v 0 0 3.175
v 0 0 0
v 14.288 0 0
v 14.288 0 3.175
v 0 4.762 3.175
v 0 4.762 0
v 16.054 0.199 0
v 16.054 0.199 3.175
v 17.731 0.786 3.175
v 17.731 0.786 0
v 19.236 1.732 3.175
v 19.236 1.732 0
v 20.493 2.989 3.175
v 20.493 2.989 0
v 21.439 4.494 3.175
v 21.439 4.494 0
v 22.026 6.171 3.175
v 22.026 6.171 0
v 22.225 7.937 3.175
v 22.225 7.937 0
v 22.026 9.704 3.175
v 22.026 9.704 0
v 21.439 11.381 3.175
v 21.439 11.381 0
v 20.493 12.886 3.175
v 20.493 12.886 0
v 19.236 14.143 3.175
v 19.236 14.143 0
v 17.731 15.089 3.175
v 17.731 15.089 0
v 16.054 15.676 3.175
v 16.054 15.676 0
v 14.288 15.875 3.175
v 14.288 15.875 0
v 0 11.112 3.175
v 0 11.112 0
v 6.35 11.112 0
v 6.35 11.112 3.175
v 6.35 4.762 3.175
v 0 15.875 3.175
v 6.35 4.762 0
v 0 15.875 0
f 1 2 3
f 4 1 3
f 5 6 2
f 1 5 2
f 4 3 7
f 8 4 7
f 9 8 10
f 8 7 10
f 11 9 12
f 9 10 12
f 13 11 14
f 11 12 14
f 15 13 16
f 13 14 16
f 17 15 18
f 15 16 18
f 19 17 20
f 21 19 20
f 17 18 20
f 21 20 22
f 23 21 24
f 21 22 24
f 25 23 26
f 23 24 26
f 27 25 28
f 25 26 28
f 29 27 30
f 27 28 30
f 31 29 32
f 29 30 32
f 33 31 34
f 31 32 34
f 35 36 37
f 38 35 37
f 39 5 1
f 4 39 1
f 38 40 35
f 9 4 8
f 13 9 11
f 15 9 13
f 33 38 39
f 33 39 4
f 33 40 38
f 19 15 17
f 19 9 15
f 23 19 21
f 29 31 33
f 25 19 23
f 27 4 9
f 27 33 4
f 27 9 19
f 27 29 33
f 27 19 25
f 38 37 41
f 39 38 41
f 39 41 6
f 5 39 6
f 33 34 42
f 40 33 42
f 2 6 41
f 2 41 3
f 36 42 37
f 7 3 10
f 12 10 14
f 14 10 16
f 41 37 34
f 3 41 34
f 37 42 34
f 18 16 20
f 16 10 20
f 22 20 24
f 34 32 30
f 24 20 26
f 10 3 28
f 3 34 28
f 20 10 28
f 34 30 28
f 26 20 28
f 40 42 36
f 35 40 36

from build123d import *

# Parameters (mm, degrees)
BOSS_EXTRUDE1_DEPTH = 3.175


with BuildPart() as part:
    # Sketch1 → Boss-Extrude1 (new body)
    with BuildSketch(Plane.XY):
        with BuildLine():
            Line((0, 0), (14.2875, 0))
            ThreePointArc((14.2875, 0), (22.225, 7.9375), (14.2875, 15.875))
            Line((14.2875, 15.875), (0, 15.875))
            Line((0, 15.875), (0, 11.1125))
            Line((0, 11.1125), (6.35, 11.1125))
            Line((6.35, 11.1125), (6.35, 4.7625))
            Line((6.35, 4.7625), (0, 4.7625))
            Line((0, 4.7625), (0, 0))
        make_face()
    extrude(amount=BOSS_EXTRUDE1_DEPTH)


solid = part.part
